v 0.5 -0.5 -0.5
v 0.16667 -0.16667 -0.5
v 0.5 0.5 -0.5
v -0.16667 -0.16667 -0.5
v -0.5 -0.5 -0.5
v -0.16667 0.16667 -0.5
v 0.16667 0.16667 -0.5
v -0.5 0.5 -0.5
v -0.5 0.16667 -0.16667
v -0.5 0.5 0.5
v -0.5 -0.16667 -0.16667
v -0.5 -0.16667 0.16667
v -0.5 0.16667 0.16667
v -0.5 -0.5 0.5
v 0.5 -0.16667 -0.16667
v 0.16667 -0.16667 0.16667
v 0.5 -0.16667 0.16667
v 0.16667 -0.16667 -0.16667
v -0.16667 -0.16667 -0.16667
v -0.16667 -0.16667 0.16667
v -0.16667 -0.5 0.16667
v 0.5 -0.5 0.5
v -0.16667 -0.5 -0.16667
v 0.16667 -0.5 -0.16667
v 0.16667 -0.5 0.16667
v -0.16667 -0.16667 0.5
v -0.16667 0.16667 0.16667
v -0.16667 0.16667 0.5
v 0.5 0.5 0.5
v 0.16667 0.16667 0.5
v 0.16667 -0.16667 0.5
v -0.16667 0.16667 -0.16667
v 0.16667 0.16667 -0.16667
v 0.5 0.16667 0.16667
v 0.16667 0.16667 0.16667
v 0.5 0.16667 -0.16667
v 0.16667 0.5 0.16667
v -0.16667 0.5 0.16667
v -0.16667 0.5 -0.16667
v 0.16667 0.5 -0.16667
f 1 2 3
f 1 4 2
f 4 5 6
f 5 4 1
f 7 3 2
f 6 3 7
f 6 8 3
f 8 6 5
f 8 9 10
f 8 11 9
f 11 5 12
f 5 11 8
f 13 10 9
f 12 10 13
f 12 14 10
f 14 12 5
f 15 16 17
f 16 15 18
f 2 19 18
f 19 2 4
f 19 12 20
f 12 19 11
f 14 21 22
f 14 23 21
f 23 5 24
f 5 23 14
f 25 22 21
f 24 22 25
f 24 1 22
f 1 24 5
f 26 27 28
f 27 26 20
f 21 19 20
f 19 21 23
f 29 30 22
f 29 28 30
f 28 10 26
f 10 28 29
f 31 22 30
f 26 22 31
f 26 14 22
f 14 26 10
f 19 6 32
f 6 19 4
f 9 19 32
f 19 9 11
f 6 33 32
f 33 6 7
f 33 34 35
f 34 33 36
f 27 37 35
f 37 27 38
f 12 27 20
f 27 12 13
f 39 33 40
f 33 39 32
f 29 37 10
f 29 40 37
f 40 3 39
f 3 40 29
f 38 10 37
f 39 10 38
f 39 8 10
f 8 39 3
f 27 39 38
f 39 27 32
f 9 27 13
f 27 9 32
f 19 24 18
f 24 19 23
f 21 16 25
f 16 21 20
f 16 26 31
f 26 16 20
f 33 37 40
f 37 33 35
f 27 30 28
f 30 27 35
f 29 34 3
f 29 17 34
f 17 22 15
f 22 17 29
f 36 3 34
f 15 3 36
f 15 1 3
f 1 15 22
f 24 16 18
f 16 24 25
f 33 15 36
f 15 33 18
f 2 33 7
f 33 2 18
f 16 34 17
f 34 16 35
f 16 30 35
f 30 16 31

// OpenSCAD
//  Level of Menger sponge
level = 1;

//  Render cross section? Or the sponge?
render_cross_section = false;

//  Rotation around the X axis (angles)
rot_x = 0;  // [-360:0.1:+360]

//  Rotation around the Y axis (angles)
rot_y = 0;  // [-360:0.1:+360]

//  Rotation around the Z axis (angles)
rot_z = 0;  // [-360:0.1:+360]


module menger_sponge(level=1) {
    assert(level >= 0,
        "Level of Menger sponge must be non-negative");

    //  Voxels of a 3x3x3 Menger sponge
    bitmap = [
        [
            [ 1, 1, 1 ],
            [ 1, 0, 1 ],
            [ 1, 1, 1 ],
        ],
        [
            [ 1, 0, 1 ],
            [ 0, 0, 0 ],
            [ 1, 0, 1 ],
        ],
        [
            [ 1, 1, 1 ],
            [ 1, 0, 1 ],
            [ 1, 1, 1 ],
        ],
    ];

    if (level > 0) {
        //  Level 1 and above, render the voxels out of
        //  third-sized Menger sponges one level lower.
        scale([1/3, 1/3, 1/3]) {
            for (x = [0:2], y = [0:2], z = [0:2]) {
                if (bitmap[x][y][z]) {
                    translate([x, y, z])
                    menger_sponge(level-1);
                }
            }
        }
    }
    else {
        //  A level-0 Menger sponge is just a cube.
        cube();
    }
}

module _rotate(rot_x, rot_y, rot_z) {
    rotate(a=[rot_x, rot_y, rot_z])
    translate([-0.5, -0.5, -0.5])
    children();
}

//  [?] Can you pick the transformation (e.g. `projection()`)
//      conditionally?
//      Something like "(bool ? translate() : rotate()) cube();"?
if (render_cross_section) {
    projection(cut = true)
    _rotate(rot_x, rot_y, rot_z)
    menger_sponge(level=level);
}
else {
    _rotate(rot_x, rot_y, rot_z)
    menger_sponge(level=level);
}
